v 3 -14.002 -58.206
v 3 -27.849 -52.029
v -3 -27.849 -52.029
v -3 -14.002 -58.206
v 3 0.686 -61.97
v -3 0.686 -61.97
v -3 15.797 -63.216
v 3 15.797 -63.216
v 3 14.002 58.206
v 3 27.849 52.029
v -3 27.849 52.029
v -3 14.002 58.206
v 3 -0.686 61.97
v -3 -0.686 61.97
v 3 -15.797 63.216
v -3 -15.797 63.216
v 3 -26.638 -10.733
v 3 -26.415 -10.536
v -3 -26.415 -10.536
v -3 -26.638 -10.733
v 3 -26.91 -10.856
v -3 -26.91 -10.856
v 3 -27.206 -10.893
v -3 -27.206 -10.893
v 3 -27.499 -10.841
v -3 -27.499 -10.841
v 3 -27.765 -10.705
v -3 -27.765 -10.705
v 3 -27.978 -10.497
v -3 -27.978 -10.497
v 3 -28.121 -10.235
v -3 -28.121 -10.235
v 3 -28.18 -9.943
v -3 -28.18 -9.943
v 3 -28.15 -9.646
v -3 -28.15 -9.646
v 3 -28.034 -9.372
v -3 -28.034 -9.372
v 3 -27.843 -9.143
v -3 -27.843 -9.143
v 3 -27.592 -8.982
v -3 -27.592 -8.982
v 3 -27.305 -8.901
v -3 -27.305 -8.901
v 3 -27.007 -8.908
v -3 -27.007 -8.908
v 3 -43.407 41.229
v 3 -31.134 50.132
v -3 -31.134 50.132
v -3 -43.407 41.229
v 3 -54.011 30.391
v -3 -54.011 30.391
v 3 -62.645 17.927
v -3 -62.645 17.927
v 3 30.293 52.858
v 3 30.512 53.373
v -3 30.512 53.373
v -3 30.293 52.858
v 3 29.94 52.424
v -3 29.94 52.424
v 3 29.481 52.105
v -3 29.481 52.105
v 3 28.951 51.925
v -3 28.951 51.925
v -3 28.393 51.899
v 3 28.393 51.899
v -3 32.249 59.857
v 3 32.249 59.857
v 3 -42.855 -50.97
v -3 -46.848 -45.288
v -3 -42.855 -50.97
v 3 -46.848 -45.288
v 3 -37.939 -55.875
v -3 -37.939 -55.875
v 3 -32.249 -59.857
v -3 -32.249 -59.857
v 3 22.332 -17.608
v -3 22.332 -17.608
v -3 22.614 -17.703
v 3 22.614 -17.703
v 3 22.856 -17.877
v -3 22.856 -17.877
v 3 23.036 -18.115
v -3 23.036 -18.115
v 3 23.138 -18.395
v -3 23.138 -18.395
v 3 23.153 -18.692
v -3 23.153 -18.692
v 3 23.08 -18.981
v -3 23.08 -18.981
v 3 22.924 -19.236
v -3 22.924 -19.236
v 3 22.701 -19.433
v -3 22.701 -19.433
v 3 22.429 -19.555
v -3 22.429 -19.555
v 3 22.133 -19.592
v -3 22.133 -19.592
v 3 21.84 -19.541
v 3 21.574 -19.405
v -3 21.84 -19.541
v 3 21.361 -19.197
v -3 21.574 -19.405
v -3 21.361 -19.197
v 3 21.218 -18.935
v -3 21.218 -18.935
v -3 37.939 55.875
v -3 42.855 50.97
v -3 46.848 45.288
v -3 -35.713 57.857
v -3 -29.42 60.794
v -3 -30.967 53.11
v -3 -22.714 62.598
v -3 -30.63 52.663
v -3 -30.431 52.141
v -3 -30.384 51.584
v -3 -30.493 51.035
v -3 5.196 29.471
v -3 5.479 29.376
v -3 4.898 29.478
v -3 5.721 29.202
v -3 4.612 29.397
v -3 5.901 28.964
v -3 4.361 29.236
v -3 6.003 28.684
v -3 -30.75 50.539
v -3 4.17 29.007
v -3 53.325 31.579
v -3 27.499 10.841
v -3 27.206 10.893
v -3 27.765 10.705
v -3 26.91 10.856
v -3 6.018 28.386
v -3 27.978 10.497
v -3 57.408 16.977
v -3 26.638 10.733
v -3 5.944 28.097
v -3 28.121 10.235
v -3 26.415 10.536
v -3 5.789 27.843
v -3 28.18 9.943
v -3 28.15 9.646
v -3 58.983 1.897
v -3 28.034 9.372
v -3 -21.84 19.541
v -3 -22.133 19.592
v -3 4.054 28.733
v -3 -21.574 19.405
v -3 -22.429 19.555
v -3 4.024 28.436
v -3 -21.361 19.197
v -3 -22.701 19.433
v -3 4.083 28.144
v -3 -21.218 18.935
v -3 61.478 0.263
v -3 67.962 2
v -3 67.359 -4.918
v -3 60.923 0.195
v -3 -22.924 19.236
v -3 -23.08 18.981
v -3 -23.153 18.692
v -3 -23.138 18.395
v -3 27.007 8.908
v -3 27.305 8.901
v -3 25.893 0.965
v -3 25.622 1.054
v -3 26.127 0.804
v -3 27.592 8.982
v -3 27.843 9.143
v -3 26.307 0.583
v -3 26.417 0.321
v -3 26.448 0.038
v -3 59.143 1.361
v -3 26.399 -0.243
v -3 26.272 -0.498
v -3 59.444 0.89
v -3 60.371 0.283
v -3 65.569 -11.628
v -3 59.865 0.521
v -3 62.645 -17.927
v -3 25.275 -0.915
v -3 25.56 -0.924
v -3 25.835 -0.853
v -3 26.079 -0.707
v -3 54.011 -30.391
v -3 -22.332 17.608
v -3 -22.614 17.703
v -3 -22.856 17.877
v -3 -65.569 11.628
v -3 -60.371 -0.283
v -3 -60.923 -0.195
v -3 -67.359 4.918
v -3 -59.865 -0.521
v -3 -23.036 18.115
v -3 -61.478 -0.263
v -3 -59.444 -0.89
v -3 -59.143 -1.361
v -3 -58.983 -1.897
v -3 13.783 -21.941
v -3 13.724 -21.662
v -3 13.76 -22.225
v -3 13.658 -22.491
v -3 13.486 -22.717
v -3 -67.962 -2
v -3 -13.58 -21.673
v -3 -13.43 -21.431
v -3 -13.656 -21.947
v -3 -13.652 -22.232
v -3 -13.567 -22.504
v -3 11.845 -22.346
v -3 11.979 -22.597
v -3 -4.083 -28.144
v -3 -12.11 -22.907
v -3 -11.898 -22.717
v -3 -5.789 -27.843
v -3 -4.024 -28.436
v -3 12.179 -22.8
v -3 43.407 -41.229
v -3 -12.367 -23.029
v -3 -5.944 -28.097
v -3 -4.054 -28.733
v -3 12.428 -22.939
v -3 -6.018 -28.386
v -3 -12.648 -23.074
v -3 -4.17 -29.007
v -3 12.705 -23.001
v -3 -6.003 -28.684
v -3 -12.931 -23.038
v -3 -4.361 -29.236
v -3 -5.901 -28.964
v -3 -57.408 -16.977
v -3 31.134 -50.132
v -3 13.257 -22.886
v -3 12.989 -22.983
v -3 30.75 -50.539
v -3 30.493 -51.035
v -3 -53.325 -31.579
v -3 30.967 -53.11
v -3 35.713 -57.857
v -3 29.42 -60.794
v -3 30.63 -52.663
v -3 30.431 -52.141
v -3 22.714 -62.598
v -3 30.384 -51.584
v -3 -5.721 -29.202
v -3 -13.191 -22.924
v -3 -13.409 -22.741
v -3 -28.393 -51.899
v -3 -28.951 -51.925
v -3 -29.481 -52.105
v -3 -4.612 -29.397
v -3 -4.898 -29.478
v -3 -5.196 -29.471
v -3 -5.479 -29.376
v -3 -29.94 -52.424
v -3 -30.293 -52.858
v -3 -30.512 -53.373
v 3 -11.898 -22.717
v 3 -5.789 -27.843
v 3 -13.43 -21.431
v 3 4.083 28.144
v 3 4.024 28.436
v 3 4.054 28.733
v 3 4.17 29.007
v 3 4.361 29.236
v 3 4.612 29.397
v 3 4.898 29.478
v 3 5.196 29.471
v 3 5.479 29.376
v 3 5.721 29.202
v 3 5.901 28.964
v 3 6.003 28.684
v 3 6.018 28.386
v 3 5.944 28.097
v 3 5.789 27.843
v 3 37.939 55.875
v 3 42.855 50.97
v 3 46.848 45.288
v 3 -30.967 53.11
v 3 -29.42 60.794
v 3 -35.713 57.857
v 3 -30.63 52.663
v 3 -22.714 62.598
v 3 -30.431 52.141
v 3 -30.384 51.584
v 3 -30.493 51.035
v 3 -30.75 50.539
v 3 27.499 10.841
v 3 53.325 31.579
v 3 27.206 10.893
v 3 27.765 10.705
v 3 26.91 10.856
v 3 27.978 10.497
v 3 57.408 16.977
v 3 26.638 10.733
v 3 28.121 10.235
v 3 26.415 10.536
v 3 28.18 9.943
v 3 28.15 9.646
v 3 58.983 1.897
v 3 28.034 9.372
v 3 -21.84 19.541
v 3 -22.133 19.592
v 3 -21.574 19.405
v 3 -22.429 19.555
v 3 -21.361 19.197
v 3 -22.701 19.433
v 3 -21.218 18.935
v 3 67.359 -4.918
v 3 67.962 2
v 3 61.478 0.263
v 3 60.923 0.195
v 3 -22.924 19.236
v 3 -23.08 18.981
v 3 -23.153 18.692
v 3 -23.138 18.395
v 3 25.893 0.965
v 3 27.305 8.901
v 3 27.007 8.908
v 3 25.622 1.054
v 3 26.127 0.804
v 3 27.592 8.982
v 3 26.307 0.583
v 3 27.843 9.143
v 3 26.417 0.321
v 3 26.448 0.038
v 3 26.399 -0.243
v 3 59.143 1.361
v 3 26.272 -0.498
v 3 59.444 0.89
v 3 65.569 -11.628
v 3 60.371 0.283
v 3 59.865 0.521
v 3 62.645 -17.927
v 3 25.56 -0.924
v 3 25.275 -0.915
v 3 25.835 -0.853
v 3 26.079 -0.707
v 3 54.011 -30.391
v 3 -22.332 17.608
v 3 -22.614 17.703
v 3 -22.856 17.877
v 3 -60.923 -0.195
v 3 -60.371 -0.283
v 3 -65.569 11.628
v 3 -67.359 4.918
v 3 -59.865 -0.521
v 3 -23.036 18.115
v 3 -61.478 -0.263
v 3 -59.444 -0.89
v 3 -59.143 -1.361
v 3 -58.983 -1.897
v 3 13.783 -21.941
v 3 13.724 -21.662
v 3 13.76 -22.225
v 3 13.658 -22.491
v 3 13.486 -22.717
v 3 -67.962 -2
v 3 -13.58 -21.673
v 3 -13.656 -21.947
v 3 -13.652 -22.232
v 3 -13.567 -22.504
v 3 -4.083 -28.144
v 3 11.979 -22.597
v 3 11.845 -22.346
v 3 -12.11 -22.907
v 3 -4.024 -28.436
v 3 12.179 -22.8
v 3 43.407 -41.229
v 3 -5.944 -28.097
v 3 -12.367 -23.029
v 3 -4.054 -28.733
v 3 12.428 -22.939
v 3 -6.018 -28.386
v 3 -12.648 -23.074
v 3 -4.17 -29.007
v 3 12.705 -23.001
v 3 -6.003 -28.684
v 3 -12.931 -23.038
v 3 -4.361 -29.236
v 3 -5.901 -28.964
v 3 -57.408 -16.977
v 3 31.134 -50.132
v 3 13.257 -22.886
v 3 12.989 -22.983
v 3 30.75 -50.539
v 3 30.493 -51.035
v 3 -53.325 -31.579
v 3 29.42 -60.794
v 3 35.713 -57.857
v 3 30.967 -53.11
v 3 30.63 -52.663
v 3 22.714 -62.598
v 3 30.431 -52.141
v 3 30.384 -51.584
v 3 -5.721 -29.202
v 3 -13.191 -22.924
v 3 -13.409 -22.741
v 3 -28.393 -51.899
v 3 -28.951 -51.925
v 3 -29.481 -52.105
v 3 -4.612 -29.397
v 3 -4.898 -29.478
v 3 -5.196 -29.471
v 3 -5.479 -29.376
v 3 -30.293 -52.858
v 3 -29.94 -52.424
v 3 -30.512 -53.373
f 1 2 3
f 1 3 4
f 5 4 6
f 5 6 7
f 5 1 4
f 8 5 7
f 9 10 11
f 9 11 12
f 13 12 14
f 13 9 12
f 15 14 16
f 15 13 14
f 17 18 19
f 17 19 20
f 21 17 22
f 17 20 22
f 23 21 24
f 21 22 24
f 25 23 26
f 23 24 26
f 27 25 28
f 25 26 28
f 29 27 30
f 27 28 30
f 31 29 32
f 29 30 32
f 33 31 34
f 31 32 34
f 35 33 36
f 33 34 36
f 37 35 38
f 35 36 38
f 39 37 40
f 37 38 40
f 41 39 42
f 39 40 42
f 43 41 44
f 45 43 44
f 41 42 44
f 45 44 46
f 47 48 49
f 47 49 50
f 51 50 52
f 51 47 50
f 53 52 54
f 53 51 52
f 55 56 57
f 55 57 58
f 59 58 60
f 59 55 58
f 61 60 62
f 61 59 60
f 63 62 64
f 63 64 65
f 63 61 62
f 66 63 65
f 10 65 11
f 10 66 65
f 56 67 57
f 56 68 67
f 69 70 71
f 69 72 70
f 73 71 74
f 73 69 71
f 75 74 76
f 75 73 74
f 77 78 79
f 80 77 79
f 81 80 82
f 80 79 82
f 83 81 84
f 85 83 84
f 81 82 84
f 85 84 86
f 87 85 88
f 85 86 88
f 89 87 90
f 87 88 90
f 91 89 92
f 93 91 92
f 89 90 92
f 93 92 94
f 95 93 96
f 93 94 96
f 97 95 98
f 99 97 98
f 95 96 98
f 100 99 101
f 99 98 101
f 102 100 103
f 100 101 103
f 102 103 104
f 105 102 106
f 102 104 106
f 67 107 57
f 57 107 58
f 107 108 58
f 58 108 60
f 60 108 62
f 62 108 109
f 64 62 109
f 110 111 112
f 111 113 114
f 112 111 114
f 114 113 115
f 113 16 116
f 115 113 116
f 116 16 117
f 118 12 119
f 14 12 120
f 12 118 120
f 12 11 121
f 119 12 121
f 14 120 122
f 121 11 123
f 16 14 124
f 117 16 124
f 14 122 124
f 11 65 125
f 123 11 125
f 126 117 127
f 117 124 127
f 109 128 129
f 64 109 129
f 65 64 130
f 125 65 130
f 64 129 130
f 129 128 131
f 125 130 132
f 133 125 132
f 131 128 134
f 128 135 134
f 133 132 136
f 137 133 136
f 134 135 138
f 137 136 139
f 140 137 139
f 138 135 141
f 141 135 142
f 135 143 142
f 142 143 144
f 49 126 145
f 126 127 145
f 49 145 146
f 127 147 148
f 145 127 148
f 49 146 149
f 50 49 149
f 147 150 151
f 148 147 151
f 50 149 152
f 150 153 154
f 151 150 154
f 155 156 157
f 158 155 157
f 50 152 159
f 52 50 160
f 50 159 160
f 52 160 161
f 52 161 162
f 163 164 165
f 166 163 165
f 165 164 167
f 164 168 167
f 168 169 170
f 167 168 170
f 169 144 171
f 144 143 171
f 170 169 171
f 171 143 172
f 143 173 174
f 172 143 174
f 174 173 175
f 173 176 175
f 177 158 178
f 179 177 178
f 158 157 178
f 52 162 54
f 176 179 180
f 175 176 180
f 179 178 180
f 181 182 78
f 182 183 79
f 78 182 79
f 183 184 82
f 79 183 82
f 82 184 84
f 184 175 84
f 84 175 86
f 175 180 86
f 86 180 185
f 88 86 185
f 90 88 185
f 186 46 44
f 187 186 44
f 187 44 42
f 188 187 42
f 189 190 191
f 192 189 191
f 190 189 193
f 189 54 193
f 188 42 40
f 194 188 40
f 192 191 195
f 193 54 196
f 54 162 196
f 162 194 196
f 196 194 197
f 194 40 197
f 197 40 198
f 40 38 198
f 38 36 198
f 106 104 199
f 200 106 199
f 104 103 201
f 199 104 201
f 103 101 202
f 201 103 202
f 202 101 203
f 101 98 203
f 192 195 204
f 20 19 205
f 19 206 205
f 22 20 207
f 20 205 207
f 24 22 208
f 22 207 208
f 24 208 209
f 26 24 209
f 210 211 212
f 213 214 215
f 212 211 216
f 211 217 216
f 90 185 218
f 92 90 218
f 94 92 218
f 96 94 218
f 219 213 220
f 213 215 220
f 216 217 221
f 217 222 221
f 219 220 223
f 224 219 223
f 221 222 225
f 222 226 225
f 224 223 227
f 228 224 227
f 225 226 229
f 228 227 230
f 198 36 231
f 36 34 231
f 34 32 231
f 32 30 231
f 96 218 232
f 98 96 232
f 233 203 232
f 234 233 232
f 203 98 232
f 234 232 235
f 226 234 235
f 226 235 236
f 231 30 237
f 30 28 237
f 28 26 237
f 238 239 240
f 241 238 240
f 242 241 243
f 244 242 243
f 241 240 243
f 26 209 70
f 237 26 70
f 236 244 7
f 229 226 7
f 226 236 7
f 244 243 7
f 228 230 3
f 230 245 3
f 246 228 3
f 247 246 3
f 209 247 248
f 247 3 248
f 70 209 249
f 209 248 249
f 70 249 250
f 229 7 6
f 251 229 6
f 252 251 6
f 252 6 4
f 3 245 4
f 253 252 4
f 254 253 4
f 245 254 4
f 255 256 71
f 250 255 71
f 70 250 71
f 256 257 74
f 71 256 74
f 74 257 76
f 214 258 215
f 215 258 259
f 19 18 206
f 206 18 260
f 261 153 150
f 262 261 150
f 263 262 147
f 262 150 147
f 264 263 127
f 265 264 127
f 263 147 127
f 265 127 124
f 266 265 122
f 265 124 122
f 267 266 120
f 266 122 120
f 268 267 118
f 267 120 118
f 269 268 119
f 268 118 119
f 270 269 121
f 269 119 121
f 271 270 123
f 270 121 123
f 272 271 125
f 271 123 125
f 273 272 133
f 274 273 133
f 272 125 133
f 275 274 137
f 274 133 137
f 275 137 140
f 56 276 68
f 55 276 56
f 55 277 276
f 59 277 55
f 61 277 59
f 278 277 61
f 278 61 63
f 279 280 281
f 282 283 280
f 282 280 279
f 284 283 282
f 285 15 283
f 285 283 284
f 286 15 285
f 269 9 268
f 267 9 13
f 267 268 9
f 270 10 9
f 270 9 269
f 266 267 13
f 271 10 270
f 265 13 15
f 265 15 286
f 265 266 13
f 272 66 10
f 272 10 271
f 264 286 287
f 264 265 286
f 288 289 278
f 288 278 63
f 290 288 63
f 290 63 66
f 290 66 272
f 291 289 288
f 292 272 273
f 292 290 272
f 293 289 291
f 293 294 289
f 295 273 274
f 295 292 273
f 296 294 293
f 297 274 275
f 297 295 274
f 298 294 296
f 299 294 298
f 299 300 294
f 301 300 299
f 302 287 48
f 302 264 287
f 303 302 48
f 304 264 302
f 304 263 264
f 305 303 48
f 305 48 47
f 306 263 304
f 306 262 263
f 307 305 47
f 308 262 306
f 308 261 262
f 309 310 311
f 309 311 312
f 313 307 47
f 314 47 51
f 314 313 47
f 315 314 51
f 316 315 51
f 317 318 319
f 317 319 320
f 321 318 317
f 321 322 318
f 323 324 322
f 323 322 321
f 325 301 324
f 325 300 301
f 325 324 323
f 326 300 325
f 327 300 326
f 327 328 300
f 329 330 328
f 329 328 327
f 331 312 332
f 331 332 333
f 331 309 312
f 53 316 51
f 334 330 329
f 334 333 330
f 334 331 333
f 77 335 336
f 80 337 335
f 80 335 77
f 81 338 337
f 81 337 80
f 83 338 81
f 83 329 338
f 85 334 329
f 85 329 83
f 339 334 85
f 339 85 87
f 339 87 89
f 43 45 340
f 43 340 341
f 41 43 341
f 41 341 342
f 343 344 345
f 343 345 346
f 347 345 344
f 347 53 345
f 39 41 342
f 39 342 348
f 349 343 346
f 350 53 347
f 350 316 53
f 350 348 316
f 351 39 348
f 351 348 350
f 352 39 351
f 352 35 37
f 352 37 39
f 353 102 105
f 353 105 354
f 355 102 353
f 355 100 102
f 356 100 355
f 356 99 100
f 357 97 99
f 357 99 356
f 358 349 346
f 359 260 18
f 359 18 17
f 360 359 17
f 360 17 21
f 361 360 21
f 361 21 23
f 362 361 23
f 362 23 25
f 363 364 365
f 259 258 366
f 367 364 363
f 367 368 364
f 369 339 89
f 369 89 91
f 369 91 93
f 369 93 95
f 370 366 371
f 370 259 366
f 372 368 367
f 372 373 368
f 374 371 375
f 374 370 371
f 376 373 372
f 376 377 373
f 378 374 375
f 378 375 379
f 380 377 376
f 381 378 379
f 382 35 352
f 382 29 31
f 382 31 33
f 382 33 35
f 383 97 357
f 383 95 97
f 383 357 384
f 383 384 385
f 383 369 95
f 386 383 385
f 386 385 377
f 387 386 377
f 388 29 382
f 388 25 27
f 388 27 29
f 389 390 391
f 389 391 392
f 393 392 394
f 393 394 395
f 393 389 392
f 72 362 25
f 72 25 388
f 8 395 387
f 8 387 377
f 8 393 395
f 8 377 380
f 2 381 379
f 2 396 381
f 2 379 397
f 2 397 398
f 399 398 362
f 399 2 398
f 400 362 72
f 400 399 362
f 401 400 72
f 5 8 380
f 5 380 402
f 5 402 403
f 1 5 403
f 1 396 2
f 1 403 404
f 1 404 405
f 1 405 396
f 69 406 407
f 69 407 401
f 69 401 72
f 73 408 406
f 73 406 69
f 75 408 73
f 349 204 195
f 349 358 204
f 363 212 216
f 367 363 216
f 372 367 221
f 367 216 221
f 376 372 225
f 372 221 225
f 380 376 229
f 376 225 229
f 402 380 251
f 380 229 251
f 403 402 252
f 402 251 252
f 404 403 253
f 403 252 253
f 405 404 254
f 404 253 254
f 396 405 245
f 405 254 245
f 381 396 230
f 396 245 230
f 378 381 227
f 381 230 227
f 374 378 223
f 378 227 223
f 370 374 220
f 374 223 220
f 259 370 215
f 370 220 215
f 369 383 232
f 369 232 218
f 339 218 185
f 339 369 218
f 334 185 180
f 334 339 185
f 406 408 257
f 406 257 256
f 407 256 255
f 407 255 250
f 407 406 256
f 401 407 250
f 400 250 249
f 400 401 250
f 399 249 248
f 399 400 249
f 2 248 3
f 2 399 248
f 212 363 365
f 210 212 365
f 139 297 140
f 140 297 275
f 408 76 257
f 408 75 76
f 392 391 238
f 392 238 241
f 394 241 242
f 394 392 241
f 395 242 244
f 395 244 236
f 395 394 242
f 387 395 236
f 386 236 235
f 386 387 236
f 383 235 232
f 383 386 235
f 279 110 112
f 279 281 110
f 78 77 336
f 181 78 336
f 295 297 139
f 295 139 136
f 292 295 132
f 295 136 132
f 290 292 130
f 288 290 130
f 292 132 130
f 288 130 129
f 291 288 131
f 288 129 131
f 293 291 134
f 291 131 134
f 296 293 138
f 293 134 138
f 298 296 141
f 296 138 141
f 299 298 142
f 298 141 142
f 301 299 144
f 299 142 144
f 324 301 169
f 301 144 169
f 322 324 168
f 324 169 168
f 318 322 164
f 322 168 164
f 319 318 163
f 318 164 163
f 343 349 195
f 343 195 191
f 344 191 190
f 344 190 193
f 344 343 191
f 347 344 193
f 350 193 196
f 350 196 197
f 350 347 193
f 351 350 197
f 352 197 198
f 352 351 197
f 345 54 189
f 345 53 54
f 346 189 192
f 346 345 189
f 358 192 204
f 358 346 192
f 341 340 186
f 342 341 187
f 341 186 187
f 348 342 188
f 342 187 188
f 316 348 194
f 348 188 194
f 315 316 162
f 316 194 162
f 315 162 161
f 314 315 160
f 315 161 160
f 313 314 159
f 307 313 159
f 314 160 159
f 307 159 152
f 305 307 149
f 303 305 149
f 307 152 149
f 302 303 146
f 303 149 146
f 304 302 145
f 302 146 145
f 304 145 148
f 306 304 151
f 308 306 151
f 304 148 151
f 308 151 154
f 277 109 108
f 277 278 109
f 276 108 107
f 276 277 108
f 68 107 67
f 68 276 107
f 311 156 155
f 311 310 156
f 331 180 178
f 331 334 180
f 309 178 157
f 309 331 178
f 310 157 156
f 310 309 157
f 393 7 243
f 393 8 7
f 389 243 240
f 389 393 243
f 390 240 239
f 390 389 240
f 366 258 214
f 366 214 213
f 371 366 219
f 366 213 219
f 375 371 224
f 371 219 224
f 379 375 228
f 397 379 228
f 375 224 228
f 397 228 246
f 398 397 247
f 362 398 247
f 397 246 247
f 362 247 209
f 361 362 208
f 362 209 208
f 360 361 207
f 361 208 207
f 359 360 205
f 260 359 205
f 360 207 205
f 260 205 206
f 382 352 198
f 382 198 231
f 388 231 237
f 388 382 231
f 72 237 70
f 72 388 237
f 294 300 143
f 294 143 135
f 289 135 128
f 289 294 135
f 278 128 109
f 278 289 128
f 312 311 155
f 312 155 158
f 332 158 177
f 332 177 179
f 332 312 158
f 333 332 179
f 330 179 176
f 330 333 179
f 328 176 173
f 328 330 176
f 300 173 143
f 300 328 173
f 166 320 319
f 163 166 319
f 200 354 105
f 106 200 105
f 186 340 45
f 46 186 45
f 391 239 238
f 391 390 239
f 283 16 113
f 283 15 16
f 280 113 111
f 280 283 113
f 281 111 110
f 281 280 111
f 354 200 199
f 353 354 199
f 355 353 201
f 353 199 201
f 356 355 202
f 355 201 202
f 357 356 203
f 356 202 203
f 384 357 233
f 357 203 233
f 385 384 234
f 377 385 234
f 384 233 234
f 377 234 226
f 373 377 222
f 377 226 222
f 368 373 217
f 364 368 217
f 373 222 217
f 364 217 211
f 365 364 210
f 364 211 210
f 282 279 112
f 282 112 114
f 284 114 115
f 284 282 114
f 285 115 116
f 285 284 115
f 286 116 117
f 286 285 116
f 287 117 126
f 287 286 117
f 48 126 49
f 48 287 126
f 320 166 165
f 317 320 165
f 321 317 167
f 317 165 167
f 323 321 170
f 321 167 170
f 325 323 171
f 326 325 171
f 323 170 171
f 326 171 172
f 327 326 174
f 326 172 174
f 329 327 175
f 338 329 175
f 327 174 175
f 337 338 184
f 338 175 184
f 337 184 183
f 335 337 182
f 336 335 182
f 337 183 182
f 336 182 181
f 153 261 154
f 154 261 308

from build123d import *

# Parameters (mm, degrees)
SKETCH1_R                = 59
EXTRUDE1_DEPTH           = 3
EXTRUDE2_DEPTH           = 3
CIRPATTERN1_COUNT        = 6
F_2_0_2_DIAMETER_HOLE1_D = 2
F_2_0_2_DIAMETER_HOLE3_D = 2
CIRPATTERN2_COUNT        = 3
CIRPATTERN2_ANGLE        = 120


with BuildPart() as part:
    # Sketch1 → Extrude1 (new, symmetric)
    with BuildSketch(Plane(origin=(0, 0, 0), x_dir=(0, 0, -1), z_dir=(1, 0, 0))):
        Circle(SKETCH1_R)
        Polygon((18.592791334, 22.158025869), (-9.893017633, 27.180842557), (-28.485808967, 5.022816688), (-18.592791334, -22.158025869), (9.893017633, -27.180842557), (28.485808967, -5.022816688), align=None, mode=Mode.SUBTRACT)
    extrude(amount=EXTRUDE1_DEPTH, both=True)

    # Sketch2 → Extrude2 (add, symmetric)
    with BuildSketch(Plane(origin=(0, 0, 0), x_dir=(0, 0, -1), z_dir=(1, 0, 0))):
        with BuildLine():
            Line((-2, 67.961805723), (-0.262709442, 61.478149092))
            ThreePointArc((-0.262709442, 61.478149092), (-0.58620663, 59.77173183), (-2.122608272, 58.961805723))
            ThreePointArc((-2.122608272, 58.961805723), (28.679663449, 51.560419941), (51.21368579, 29.294340542))
            ThreePointArc((51.21368579, 29.294340542), (36.791707484, 48.186627241), (17.927108603, 62.644803614))
            ThreePointArc((17.927108603, 62.644803614), (8.312130826, 66.609702921), (-2, 67.961805723))
        make_face()
    extrude2 = extrude(amount=EXTRUDE2_DEPTH, both=True)

    # CirPattern1: Extrude2 ×6 about axis
    cirpattern1_axis = Axis((0, 0, 0), (1, 0, 0))
    for i in range(1, CIRPATTERN1_COUNT):
        add(extrude2.rotate(cirpattern1_axis, i * 360 / CIRPATTERN1_COUNT))

    # Ø2.0 (2) Diameter Hole1 (through all)
    with Locations(Plane(origin=(3, 0, 0), x_dir=(0, 0, -1), z_dir=(1, 0, 0))):
        with Locations((-9.893017633, 27.180842557), (18.592791334, 22.158025869), (28.485808967, -5.022816688), (9.893017633, -27.180842557), (-18.592791334, -22.158025869), (-28.485808967, 5.022816688)):
            Hole(F_2_0_2_DIAMETER_HOLE1_D / 2)

    # Ø2.0 (2) Diameter Hole3 (through all)
    with Locations(Plane(origin=(3, 0, 0), x_dir=(0, 0, -1), z_dir=(1, 0, 0))):
        with Locations((-0.069478726, 25.448687602)):
            f_2_0_2_diameter_hole3 = Hole(F_2_0_2_DIAMETER_HOLE3_D / 2)

    # CirPattern2: Ø2.0 (2) Diameter Hole3 ×3 about axis
    cirpattern2_axis = Axis((0, 0, 0), (-1, 0, 0))
    for i in range(1, CIRPATTERN2_COUNT):
        add(f_2_0_2_diameter_hole3.rotate(cirpattern2_axis, i * CIRPATTERN2_ANGLE / (CIRPATTERN2_COUNT - 1)), mode=Mode.SUBTRACT)


solid = part.part
